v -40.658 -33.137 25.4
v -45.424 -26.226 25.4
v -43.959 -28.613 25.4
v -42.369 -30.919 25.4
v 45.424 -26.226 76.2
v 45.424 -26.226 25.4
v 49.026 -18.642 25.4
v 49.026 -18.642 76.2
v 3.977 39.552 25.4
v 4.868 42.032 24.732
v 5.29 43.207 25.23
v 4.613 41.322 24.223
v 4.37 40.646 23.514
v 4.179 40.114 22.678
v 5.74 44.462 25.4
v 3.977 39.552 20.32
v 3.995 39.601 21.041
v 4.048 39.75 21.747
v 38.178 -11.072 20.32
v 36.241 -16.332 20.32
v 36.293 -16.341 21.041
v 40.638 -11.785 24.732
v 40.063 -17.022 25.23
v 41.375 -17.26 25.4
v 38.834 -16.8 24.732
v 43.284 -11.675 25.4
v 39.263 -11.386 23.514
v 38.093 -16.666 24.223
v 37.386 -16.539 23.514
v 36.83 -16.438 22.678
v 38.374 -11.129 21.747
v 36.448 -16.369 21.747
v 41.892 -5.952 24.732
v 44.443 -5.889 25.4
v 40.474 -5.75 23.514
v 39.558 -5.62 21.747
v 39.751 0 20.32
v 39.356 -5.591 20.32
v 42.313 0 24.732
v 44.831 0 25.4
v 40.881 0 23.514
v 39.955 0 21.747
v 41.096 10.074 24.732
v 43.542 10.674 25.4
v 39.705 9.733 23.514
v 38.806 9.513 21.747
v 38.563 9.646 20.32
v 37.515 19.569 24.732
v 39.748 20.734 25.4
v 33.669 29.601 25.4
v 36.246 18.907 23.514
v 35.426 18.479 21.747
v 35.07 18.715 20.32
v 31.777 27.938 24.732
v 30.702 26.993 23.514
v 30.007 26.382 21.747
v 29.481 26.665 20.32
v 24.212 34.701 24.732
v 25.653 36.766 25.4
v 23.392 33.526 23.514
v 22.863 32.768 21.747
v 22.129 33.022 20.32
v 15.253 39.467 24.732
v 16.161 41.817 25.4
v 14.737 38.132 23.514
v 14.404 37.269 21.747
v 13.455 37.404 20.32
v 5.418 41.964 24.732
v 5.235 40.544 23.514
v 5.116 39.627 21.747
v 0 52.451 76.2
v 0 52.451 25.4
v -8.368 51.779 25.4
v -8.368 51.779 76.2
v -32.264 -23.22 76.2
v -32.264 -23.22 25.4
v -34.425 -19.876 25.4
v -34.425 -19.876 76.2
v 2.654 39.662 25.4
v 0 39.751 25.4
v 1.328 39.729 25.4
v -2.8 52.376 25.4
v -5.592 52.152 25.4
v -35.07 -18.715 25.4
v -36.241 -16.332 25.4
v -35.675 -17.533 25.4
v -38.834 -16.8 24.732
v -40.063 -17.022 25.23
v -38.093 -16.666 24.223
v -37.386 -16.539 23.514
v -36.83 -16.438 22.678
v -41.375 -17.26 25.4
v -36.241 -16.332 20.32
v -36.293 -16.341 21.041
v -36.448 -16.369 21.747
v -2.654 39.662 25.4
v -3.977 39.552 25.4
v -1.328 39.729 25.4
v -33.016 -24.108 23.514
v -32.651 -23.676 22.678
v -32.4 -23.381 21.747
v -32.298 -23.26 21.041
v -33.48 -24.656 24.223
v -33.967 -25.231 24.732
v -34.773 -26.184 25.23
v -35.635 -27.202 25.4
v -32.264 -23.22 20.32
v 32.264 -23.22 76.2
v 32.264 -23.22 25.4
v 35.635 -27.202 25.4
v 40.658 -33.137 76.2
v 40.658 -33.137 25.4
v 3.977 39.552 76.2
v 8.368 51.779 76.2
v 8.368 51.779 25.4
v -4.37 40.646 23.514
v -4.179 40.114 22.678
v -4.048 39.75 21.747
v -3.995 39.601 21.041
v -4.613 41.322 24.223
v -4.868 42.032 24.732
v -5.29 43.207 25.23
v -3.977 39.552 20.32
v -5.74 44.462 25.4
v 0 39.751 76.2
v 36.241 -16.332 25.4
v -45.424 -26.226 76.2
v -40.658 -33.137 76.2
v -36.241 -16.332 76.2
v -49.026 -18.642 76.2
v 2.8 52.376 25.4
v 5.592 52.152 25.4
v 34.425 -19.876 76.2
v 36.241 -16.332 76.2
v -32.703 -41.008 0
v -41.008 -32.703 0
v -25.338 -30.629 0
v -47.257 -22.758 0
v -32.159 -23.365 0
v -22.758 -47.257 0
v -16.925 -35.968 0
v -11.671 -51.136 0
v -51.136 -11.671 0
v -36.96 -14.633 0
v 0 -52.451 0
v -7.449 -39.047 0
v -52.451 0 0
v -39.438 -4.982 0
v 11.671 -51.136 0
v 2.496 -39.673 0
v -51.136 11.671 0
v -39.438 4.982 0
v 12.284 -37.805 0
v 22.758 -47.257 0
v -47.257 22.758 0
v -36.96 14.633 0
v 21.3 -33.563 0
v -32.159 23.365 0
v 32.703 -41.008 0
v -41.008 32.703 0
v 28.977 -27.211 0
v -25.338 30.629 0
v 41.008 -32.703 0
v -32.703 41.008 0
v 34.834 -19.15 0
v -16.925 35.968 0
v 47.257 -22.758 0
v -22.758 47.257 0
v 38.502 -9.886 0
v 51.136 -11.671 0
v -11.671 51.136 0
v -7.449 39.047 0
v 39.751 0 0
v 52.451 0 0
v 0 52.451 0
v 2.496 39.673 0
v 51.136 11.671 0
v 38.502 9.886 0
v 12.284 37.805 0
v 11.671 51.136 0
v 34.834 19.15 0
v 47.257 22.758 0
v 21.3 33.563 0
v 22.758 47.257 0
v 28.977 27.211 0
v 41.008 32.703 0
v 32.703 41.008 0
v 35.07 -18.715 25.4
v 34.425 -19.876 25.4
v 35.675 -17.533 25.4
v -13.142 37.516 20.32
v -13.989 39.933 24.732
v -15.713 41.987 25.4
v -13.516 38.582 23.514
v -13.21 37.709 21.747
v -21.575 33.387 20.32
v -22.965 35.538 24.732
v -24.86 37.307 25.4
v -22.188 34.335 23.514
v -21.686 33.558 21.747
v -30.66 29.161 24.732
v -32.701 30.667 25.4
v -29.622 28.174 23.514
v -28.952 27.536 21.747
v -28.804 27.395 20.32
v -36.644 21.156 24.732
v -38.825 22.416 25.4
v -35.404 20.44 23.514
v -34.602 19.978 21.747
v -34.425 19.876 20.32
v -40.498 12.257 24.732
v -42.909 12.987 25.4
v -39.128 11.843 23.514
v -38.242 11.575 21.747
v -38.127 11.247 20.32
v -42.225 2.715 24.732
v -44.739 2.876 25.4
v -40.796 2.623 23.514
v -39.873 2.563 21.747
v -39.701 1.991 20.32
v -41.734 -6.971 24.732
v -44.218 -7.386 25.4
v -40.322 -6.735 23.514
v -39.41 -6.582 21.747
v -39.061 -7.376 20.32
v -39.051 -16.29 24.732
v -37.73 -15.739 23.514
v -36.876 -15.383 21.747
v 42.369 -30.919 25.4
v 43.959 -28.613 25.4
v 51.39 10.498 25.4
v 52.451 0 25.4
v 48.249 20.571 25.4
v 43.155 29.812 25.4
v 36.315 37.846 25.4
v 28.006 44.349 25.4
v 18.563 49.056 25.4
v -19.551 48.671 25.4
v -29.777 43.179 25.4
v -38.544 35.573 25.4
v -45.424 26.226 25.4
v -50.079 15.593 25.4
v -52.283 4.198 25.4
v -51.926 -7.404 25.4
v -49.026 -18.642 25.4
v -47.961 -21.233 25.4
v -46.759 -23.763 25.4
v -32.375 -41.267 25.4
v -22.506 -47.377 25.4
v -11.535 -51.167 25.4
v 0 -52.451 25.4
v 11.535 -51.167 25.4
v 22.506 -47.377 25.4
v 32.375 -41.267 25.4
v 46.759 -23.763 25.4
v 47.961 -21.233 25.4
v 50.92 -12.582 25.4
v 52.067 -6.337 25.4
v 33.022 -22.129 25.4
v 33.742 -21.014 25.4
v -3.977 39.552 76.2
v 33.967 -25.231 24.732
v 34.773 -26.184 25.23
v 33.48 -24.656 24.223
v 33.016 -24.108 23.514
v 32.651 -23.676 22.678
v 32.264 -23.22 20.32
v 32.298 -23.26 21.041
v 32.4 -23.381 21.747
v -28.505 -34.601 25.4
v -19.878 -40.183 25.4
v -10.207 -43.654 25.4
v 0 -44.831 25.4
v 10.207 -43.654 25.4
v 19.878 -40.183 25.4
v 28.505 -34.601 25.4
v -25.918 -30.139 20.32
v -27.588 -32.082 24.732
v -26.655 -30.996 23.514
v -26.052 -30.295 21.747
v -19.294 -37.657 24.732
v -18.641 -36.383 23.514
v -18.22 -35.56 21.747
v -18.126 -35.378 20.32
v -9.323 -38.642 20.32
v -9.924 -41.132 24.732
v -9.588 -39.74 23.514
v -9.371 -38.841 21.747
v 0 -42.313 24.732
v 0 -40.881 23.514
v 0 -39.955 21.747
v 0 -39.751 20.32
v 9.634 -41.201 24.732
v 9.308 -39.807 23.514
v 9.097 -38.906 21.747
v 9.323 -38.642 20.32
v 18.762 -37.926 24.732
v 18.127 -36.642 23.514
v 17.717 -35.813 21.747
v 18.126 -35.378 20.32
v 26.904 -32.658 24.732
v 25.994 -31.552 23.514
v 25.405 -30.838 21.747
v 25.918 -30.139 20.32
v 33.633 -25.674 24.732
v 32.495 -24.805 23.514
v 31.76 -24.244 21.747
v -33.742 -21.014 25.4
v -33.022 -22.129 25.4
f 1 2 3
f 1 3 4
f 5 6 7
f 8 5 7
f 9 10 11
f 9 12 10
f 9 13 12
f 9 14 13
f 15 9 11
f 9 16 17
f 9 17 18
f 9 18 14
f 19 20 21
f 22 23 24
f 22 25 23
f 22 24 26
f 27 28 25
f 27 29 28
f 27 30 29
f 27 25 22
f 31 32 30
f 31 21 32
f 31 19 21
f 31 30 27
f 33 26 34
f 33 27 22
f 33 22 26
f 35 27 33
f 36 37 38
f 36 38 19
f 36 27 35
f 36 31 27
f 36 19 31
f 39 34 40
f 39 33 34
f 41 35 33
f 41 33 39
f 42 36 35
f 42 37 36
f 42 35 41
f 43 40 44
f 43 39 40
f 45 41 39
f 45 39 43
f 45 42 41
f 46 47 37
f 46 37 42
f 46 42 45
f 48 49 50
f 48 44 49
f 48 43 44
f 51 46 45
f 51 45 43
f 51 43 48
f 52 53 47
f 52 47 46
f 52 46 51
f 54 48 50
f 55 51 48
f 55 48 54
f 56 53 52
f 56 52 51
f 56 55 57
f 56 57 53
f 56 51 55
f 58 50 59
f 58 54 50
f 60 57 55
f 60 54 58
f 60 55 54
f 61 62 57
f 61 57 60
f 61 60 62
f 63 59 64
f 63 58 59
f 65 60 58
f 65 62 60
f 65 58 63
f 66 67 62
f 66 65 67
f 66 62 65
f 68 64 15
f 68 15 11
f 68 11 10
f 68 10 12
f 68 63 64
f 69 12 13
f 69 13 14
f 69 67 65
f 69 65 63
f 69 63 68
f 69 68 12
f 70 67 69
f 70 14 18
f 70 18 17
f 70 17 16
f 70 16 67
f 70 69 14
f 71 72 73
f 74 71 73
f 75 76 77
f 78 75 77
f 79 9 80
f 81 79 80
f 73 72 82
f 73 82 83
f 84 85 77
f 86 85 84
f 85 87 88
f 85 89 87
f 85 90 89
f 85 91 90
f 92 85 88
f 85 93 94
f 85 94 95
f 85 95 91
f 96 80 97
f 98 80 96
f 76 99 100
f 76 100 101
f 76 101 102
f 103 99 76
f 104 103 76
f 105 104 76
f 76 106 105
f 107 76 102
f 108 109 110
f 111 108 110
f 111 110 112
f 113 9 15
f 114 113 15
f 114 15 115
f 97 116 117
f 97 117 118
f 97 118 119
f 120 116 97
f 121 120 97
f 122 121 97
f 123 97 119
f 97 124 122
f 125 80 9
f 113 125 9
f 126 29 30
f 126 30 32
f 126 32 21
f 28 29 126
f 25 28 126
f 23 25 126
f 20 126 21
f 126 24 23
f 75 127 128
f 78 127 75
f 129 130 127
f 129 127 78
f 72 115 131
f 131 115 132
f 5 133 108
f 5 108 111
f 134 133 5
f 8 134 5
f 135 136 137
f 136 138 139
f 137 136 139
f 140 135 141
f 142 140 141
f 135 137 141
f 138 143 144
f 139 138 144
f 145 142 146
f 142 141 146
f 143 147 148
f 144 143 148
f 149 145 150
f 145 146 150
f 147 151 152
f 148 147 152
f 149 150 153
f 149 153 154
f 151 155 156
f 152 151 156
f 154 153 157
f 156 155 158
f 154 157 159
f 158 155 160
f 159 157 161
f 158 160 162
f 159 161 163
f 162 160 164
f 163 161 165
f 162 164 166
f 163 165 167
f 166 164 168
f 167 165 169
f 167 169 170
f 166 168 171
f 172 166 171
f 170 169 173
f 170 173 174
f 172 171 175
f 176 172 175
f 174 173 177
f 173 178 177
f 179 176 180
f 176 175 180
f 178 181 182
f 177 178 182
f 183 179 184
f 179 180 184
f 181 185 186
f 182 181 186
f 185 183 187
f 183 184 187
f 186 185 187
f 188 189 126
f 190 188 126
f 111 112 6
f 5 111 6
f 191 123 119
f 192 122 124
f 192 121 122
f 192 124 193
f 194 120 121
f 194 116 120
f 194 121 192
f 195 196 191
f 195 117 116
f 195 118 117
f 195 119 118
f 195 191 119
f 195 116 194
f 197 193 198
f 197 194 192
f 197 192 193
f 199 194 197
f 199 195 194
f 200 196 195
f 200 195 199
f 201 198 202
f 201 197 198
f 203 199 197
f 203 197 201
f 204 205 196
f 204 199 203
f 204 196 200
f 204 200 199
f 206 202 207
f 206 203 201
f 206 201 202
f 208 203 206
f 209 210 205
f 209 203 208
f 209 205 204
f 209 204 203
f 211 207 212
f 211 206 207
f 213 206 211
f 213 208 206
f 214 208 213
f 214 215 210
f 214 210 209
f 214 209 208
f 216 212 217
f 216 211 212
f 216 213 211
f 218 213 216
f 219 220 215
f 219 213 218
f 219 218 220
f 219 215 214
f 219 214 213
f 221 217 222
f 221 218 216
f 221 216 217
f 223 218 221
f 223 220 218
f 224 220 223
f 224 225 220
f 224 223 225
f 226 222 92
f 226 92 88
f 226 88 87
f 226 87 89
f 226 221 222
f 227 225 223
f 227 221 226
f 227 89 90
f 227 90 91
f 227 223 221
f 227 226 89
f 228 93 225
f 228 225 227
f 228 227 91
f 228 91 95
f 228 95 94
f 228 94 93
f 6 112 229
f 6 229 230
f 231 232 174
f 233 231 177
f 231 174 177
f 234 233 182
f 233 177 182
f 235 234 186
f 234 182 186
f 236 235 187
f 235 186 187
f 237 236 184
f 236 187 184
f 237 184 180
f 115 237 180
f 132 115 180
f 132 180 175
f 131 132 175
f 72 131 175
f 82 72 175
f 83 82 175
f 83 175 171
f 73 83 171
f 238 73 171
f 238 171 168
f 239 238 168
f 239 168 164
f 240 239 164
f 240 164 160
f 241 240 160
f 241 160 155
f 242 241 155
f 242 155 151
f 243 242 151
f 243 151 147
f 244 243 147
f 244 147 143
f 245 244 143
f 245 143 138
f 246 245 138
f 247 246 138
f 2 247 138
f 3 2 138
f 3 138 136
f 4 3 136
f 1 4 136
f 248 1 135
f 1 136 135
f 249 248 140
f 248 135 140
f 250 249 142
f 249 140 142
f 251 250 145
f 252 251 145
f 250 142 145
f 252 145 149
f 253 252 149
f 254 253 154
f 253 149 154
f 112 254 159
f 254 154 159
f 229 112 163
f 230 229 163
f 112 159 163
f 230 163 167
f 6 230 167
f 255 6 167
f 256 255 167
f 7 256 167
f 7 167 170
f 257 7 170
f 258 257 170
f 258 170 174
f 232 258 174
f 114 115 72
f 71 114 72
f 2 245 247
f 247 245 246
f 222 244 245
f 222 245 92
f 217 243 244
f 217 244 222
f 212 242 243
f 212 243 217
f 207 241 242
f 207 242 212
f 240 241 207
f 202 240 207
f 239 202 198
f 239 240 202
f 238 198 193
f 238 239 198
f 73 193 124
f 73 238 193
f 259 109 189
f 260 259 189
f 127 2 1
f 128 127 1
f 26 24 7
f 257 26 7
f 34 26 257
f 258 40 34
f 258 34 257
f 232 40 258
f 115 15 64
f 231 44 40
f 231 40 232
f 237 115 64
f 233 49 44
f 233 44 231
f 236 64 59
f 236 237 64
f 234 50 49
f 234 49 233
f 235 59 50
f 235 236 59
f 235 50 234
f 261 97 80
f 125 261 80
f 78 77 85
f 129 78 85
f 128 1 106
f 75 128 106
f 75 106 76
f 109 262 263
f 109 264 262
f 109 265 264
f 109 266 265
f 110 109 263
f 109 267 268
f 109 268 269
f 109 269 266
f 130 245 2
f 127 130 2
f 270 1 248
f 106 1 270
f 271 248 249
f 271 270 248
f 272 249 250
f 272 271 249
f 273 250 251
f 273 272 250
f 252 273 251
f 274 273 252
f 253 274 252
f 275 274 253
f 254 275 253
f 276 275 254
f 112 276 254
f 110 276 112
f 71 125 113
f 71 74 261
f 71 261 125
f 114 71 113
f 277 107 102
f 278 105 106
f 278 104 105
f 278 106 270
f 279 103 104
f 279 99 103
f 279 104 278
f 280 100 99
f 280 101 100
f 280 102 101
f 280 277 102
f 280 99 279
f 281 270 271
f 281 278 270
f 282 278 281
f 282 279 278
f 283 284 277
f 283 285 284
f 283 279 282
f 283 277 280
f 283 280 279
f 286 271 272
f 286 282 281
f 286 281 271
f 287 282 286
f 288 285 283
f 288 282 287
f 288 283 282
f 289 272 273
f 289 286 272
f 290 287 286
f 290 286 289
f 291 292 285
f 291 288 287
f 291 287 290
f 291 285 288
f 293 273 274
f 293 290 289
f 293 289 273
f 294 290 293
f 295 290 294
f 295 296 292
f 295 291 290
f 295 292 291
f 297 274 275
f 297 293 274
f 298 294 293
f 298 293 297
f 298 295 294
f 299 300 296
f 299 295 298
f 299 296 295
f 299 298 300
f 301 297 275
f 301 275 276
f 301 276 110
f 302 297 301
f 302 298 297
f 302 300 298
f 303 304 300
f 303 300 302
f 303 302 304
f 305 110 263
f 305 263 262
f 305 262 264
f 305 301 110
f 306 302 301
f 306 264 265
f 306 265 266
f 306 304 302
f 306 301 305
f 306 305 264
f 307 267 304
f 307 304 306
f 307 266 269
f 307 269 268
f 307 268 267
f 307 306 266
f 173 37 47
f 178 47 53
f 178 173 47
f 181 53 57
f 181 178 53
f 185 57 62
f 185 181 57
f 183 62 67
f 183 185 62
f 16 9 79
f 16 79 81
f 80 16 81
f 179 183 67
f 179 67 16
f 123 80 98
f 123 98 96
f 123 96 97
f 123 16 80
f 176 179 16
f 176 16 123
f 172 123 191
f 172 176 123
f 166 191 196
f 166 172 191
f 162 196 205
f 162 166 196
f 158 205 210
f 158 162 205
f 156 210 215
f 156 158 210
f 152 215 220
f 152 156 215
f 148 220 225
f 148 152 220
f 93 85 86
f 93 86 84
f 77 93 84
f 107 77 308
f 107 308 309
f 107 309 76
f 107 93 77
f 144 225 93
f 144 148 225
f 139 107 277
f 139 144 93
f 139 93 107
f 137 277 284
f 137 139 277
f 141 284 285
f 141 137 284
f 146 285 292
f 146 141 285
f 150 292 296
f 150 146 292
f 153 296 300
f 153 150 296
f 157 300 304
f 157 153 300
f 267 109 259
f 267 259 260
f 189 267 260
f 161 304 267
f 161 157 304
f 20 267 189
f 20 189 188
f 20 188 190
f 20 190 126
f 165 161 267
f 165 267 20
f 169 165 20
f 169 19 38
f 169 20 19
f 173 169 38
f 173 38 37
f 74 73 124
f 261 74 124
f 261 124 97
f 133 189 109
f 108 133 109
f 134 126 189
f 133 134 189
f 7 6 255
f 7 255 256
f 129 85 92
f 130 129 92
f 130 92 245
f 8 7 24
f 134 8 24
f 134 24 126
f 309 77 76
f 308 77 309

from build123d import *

# Parameters (mm, degrees)
F0_R         = 52.451
F0_R_2       = 39.751
F1_DEPTH     = 25.4
F3_DEPTH     = 50.8
F4_T4_ANGLE  = 145.1483416982
F4_T9_ANGLE  = 145.1483416982
F4_T16_ANGLE = 145.1483416982
F4_T23_ANGLE = 145.1483416982
F4_T28_ANGLE = 42.5640131775
F4_T33_ANGLE = 42.5640131775
F4_T38_ANGLE = 102.5699239424
F4_T44_ANGLE = 102.5699239424
F4_T49_ANGLE = 102.5699239424
F4_T54_ANGLE = 145.1483416982
F4_T59_ANGLE = 145.1483416982
F4_T66_ANGLE = 145.1483416982
F4_T73_ANGLE = 145.1483416982


# Not quite as in the source:
# - a fillet or chamfer that OpenCascade refuses, or shapes differently, is made with other operations: its cross-section is extruded or revolved along the edge and cut away or added


with BuildPart() as f1:
    # F0 (on Top) → F1 (new body)
    with BuildSketch(Plane.XY):
        Circle(F0_R)
        Circle(F0_R_2, mode=Mode.SUBTRACT)
    extrude(amount=F1_DEPTH)

    # F2 (on face) → F3 (join)
    with BuildSketch(Plane.XY.offset(25.4)):
        Polygon((0, 39.751), (3.9769716214, 39.5515574627), (8.3683463891, 51.7791288041), (0, 52.451), (-8.3683463891, 51.7791288041), (-3.9769716214, 39.5515574627), align=None)
        Polygon((-49.0262141247, -18.6423638414), (-45.4238984539, -26.2255), (-40.6578677356, -33.1367649627), (-32.2641677112, -23.2199371856), (-34.4253758258, -19.8755), (-36.2411393326, -16.331620277), align=None)
        Polygon((40.6578677356, -33.1367649627), (45.4238984539, -26.2255), (49.0262141247, -18.6423638414), (36.2411393326, -16.331620277), (34.4253758258, -19.8755), (32.2641677112, -23.2199371856), align=None)
    extrude(amount=F3_DEPTH)

    # F4: fillet of radius 5.08 on 4 edges, made by hand


with BuildPart() as f4_tool2:
    # F4_s3 → F4_t4 (revolve)
    with BuildSketch(Plane(origin=(0, 0, 0), x_dir=(0, 0, 1), z_dir=(0.9760150026, -0.2177032723, 0))):
        with BuildLine():
            ThreePointArc((25.4, -44.831), (23.9121024484, -41.2388975516), (20.32, -39.751))
            Line((20.32, -39.751), (25.4, -39.751))
            Line((25.4, -39.751), (25.4, -44.831))
        make_face()
    revolve(axis=Axis((0, 0, 25.4), (0, 0, 1)), revolution_arc=F4_T4_ANGLE)

    split(bisect_by=Plane(origin=(-9.0590317285, 3.2534345735, 0), x_dir=(0, 0, 1), z_dir=(0.9411459494, -0.3380004466, 0)), keep=Keep.TOP)


with BuildPart() as f1_1:
    add(f1.part)

    # F4_t1: cut F4_tool2
    add(f4_tool2.part, mode=Mode.SUBTRACT)


with BuildPart() as f4_tool7:
    # F4_s8 → F4_t9 (revolve)
    with BuildSketch(Plane(origin=(0, 0, 0), x_dir=(0, 0, 1), z_dir=(0.9760150026, -0.2177032723, 0))):
        with BuildLine():
            ThreePointArc((25.4, -44.831), (23.9121024484, -41.2388975516), (20.32, -39.751))
            Line((20.32, -39.751), (25.4, -39.751))
            Line((25.4, -39.751), (25.4, -44.831))
        make_face()
    revolve(axis=Axis((0, 0, 25.4), (0, 0, 1)), revolution_arc=F4_T9_ANGLE)

    split(bisect_by=Plane(origin=(9.0590317285, 3.2534345735, 0), x_dir=(0, 0, 1), z_dir=(-0.9411459494, -0.3380004466, 0)), keep=Keep.TOP)

    split(bisect_by=Plane(origin=(-33.3447717685, -21.5477185928, 0), x_dir=(0, 0, 1), z_dir=(0.8398952423, 0.542748544, 0)), keep=Keep.TOP)

    split(bisect_by=Plane(origin=(-35.3332575792, -18.1035601385, 0), x_dir=(0, 0, 1), z_dir=(0.8899816481, 0.4559963443, 0)), keep=Keep.TOP)


with BuildPart() as f1_2:
    add(f1_1.part)

    # F4_t6: cut F4_tool7
    add(f4_tool7.part, mode=Mode.SUBTRACT)


with BuildPart() as f4_tool14:
    # F4_s15 → F4_t16 (revolve)
    with BuildSketch(Plane(origin=(0, 0, 0), x_dir=(0, 0, 1), z_dir=(0.9760150026, -0.2177032723, 0))):
        with BuildLine():
            ThreePointArc((25.4, -44.831), (23.9121024484, -41.2388975516), (20.32, -39.751))
            Line((20.32, -39.751), (25.4, -39.751))
            Line((25.4, -39.751), (25.4, -44.831))
        make_face()
    revolve(axis=Axis((0, 0, 25.4), (0, 0, 1)), revolution_arc=F4_T16_ANGLE)

    split(bisect_by=Plane(origin=(1.7119588741, -9.4720688973, 0), x_dir=(0, 0, 1), z_dir=(-0.1778560014, 0.9840565242, 0)), keep=Keep.TOP)

    split(bisect_by=Plane(origin=(1.9884858107, 39.6512787313, 0), x_dir=(0, 0, 1), z_dir=(-0.0500864058, -0.9987448883, 0)), keep=Keep.TOP)

    split(bisect_by=Plane(origin=(-1.9884858107, 39.6512787313, 0), x_dir=(0, 0, 1), z_dir=(0.0500864058, -0.9987448883, 0)), keep=Keep.TOP)


with BuildPart() as f1_3:
    add(f1_2.part)

    # F4_t13: cut F4_tool14
    add(f4_tool14.part, mode=Mode.SUBTRACT)


with BuildPart() as f4_tool21:
    # F4_s22 → F4_t23 (revolve)
    with BuildSketch(Plane(origin=(0, 0, 0), x_dir=(0, 0, 1), z_dir=(0.9760150026, -0.2177032723, 0))):
        with BuildLine():
            ThreePointArc((25.4, -44.831), (23.9121024484, -41.2388975516), (20.32, -39.751))
            Line((20.32, -39.751), (25.4, -39.751))
            Line((25.4, -39.751), (25.4, -44.831))
        make_face()
    revolve(axis=Axis((0, 0, 25.4), (0, 0, 1)), revolution_arc=F4_T23_ANGLE)

    split(bisect_by=Plane(origin=(-7.3470728544, 6.2186343238, 0), x_dir=(0, 0, 1), z_dir=(0.763289948, -0.6460560775, 0)), keep=Keep.TOP)


with BuildPart() as f1_4:
    add(f1_3.part)

    # F4_t20: cut F4_tool21
    add(f4_tool21.part, mode=Mode.SUBTRACT)


with BuildPart() as f4_tool26:
    # F4_s27 → F4_t28 (revolve)
    with BuildSketch(Plane(origin=(0, 0, 0), x_dir=(0, 0, 1), z_dir=(-0.6764135021, -0.7365220799, 0))):
        with BuildLine():
            ThreePointArc((25.4, -44.831), (23.9121024484, -41.2388975516), (20.32, -39.751))
            Line((20.32, -39.751), (25.4, -39.751))
            Line((25.4, -39.751), (25.4, -44.831))
        make_face()
    revolve(axis=Axis((0, 0, 25.4), (0, 0, 1)), revolution_arc=F4_T28_ANGLE)

    split(bisect_by=Plane(origin=(7.3470728544, 6.2186343238, 0), x_dir=(0, 0, 1), z_dir=(-0.763289948, -0.6460560775, 0)), keep=Keep.TOP)


with BuildPart() as f1_5:
    add(f1_4.part)

    # F4_t25: cut F4_tool26
    add(f4_tool26.part, mode=Mode.SUBTRACT)


with BuildPart() as f4_tool31:
    # F4_s32 → F4_t33 (revolve)
    with BuildSketch(Plane(origin=(0, 0, 0), x_dir=(0, 0, 1), z_dir=(-0.6764135021, -0.7365220799, 0))):
        with BuildLine():
            ThreePointArc((25.4, -44.831), (23.9121024484, -41.2388975516), (20.32, -39.751))
            Line((20.32, -39.751), (25.4, -39.751))
            Line((25.4, -39.751), (25.4, -44.831))
        make_face()
    revolve(axis=Axis((0, 0, 25.4), (0, 0, 1)), revolution_arc=F4_T33_ANGLE)

    split(bisect_by=Plane(origin=(-1.7119588741, -9.4720688973, 0), x_dir=(0, 0, 1), z_dir=(0.1778560014, 0.9840565242, 0)), keep=Keep.TOP)


with BuildPart() as f1_6:
    add(f1_5.part)

    # F4_t30: cut F4_tool31
    add(f4_tool31.part, mode=Mode.SUBTRACT)


with BuildPart() as f4_tool36:
    # F4_s37 → F4_t38 (revolve)
    with BuildSketch(Plane.XZ):
        with BuildLine():
            ThreePointArc((44.831, 25.4), (41.2388975516, 23.9121024484), (39.751, 20.32))
            Line((39.751, 20.32), (39.751, 25.4))
            Line((39.751, 25.4), (44.831, 25.4))
        make_face()
    revolve(axis=Axis((0, 0, 25.4), (0, 0, 1)), revolution_arc=F4_T38_ANGLE)

    split(bisect_by=Plane(origin=(1.9884858107, 39.6512787313, 0), x_dir=(0, 0, 1), z_dir=(-0.0500864058, -0.9987448883, 0)), keep=Keep.TOP)

    split(bisect_by=Plane(origin=(-1.9884858107, 39.6512787313, 0), x_dir=(0, 0, 1), z_dir=(0.0500864058, -0.9987448883, 0)), keep=Keep.TOP)


with BuildPart() as f1_7:
    add(f1_6.part)

    # F4_t35: cut F4_tool36
    add(f4_tool36.part, mode=Mode.SUBTRACT)


with BuildPart() as f4_tool42:
    # F4_s43 → F4_t44 (revolve)
    with BuildSketch(Plane.XZ):
        with BuildLine():
            ThreePointArc((44.831, 25.4), (41.2388975516, 23.9121024484), (39.751, 20.32))
            Line((39.751, 20.32), (39.751, 25.4))
            Line((39.751, 25.4), (44.831, 25.4))
        make_face()
    revolve(axis=Axis((0, 0, 25.4), (0, 0, 1)), revolution_arc=F4_T44_ANGLE)

    split(bisect_by=Plane(origin=(-9.0590317285, 3.2534345735, 0), x_dir=(0, 0, 1), z_dir=(0.9411459494, -0.3380004466, 0)), keep=Keep.TOP)


with BuildPart() as f1_8:
    add(f1_7.part)

    # F4_t41: cut F4_tool42
    add(f4_tool42.part, mode=Mode.SUBTRACT)


with BuildPart() as f4_tool47:
    # F4_s48 → F4_t49 (revolve)
    with BuildSketch(Plane.XZ):
        with BuildLine():
            ThreePointArc((44.831, 25.4), (41.2388975516, 23.9121024484), (39.751, 20.32))
            Line((39.751, 20.32), (39.751, 25.4))
            Line((39.751, 25.4), (44.831, 25.4))
        make_face()
    revolve(axis=Axis((0, 0, 25.4), (0, 0, 1)), revolution_arc=F4_T49_ANGLE)

    split(bisect_by=Plane(origin=(9.0590317285, 3.2534345735, 0), x_dir=(0, 0, 1), z_dir=(-0.9411459494, -0.3380004466, 0)), keep=Keep.TOP)


with BuildPart() as f1_9:
    add(f1_8.part)

    # F4_t46: cut F4_tool47
    add(f4_tool47.part, mode=Mode.SUBTRACT)


with BuildPart() as f4_tool52:
    # F4_s53 → F4_t54 (revolve)
    with BuildSketch(Plane(origin=(0, 0, 0), x_dir=(0, 0, 1), z_dir=(-0.299470937, 0.9541054229, 0))):
        with BuildLine():
            ThreePointArc((25.4, -44.831), (23.9121024484, -41.2388975516), (20.32, -39.751))
            Line((20.32, -39.751), (25.4, -39.751))
            Line((25.4, -39.751), (25.4, -44.831))
        make_face()
    revolve(axis=Axis((0, 0, 25.4), (0, 0, 1)), revolution_arc=F4_T54_ANGLE)

    split(bisect_by=Plane(origin=(1.7119588741, -9.4720688973, 0), x_dir=(0, 0, 1), z_dir=(-0.1778560014, 0.9840565242, 0)), keep=Keep.TOP)


with BuildPart() as f1_10:
    add(f1_9.part)

    # F4_t51: cut F4_tool52
    add(f4_tool52.part, mode=Mode.SUBTRACT)


with BuildPart() as f4_tool57:
    # F4_s58 → F4_t59 (revolve)
    with BuildSketch(Plane(origin=(0, 0, 0), x_dir=(0, 0, 1), z_dir=(-0.299470937, 0.9541054229, 0))):
        with BuildLine():
            ThreePointArc((25.4, -44.831), (23.9121024484, -41.2388975516), (20.32, -39.751))
            Line((20.32, -39.751), (25.4, -39.751))
            Line((25.4, -39.751), (25.4, -44.831))
        make_face()
    revolve(axis=Axis((0, 0, 25.4), (0, 0, 1)), revolution_arc=F4_T59_ANGLE)

    split(bisect_by=Plane(origin=(-7.3470728544, 6.2186343238, 0), x_dir=(0, 0, 1), z_dir=(0.763289948, -0.6460560775, 0)), keep=Keep.TOP)

    split(bisect_by=Plane(origin=(35.3332575792, -18.1035601385, 0), x_dir=(0, 0, 1), z_dir=(-0.8899816481, 0.4559963443, 0)), keep=Keep.TOP)

    split(bisect_by=Plane(origin=(33.3447717685, -21.5477185928, 0), x_dir=(0, 0, 1), z_dir=(-0.8398952423, 0.542748544, 0)), keep=Keep.TOP)


with BuildPart() as f1_11:
    add(f1_10.part)

    # F4_t56: cut F4_tool57
    add(f4_tool57.part, mode=Mode.SUBTRACT)


with BuildPart() as f4_tool64:
    # F4_s65 → F4_t66 (revolve)
    with BuildSketch(Plane(origin=(0, 0, 0), x_dir=(0, 0, 1), z_dir=(-0.299470937, 0.9541054229, 0))):
        with BuildLine():
            ThreePointArc((25.4, -44.831), (23.9121024484, -41.2388975516), (20.32, -39.751))
            Line((20.32, -39.751), (25.4, -39.751))
            Line((25.4, -39.751), (25.4, -44.831))
        make_face()
    revolve(axis=Axis((0, 0, 25.4), (0, 0, 1)), revolution_arc=F4_T66_ANGLE)

    split(bisect_by=Plane(origin=(7.3470728544, 6.2186343238, 0), x_dir=(0, 0, 1), z_dir=(-0.763289948, -0.6460560775, 0)), keep=Keep.TOP)

    split(bisect_by=Plane(origin=(-33.3447717685, -21.5477185928, 0), x_dir=(0, 0, 1), z_dir=(0.8398952423, 0.542748544, 0)), keep=Keep.TOP)

    split(bisect_by=Plane(origin=(-35.3332575792, -18.1035601385, 0), x_dir=(0, 0, 1), z_dir=(0.8899816481, 0.4559963443, 0)), keep=Keep.TOP)


with BuildPart() as f1_12:
    add(f1_11.part)

    # F4_t63: cut F4_tool64
    add(f4_tool64.part, mode=Mode.SUBTRACT)


with BuildPart() as f4_tool71:
    # F4_s72 → F4_t73 (revolve)
    with BuildSketch(Plane(origin=(0, 0, 0), x_dir=(0, 0, 1), z_dir=(-0.299470937, 0.9541054229, 0))):
        with BuildLine():
            ThreePointArc((25.4, -44.831), (23.9121024484, -41.2388975516), (20.32, -39.751))
            Line((20.32, -39.751), (25.4, -39.751))
            Line((25.4, -39.751), (25.4, -44.831))
        make_face()
    revolve(axis=Axis((0, 0, 25.4), (0, 0, 1)), revolution_arc=F4_T73_ANGLE)

    split(bisect_by=Plane(origin=(-1.7119588741, -9.4720688973, 0), x_dir=(0, 0, 1), z_dir=(0.1778560014, 0.9840565242, 0)), keep=Keep.TOP)


with BuildPart() as f1_13:
    add(f1_12.part)

    # F4_t70: cut F4_tool71
    add(f4_tool71.part, mode=Mode.SUBTRACT)


solid = f1_13.part
